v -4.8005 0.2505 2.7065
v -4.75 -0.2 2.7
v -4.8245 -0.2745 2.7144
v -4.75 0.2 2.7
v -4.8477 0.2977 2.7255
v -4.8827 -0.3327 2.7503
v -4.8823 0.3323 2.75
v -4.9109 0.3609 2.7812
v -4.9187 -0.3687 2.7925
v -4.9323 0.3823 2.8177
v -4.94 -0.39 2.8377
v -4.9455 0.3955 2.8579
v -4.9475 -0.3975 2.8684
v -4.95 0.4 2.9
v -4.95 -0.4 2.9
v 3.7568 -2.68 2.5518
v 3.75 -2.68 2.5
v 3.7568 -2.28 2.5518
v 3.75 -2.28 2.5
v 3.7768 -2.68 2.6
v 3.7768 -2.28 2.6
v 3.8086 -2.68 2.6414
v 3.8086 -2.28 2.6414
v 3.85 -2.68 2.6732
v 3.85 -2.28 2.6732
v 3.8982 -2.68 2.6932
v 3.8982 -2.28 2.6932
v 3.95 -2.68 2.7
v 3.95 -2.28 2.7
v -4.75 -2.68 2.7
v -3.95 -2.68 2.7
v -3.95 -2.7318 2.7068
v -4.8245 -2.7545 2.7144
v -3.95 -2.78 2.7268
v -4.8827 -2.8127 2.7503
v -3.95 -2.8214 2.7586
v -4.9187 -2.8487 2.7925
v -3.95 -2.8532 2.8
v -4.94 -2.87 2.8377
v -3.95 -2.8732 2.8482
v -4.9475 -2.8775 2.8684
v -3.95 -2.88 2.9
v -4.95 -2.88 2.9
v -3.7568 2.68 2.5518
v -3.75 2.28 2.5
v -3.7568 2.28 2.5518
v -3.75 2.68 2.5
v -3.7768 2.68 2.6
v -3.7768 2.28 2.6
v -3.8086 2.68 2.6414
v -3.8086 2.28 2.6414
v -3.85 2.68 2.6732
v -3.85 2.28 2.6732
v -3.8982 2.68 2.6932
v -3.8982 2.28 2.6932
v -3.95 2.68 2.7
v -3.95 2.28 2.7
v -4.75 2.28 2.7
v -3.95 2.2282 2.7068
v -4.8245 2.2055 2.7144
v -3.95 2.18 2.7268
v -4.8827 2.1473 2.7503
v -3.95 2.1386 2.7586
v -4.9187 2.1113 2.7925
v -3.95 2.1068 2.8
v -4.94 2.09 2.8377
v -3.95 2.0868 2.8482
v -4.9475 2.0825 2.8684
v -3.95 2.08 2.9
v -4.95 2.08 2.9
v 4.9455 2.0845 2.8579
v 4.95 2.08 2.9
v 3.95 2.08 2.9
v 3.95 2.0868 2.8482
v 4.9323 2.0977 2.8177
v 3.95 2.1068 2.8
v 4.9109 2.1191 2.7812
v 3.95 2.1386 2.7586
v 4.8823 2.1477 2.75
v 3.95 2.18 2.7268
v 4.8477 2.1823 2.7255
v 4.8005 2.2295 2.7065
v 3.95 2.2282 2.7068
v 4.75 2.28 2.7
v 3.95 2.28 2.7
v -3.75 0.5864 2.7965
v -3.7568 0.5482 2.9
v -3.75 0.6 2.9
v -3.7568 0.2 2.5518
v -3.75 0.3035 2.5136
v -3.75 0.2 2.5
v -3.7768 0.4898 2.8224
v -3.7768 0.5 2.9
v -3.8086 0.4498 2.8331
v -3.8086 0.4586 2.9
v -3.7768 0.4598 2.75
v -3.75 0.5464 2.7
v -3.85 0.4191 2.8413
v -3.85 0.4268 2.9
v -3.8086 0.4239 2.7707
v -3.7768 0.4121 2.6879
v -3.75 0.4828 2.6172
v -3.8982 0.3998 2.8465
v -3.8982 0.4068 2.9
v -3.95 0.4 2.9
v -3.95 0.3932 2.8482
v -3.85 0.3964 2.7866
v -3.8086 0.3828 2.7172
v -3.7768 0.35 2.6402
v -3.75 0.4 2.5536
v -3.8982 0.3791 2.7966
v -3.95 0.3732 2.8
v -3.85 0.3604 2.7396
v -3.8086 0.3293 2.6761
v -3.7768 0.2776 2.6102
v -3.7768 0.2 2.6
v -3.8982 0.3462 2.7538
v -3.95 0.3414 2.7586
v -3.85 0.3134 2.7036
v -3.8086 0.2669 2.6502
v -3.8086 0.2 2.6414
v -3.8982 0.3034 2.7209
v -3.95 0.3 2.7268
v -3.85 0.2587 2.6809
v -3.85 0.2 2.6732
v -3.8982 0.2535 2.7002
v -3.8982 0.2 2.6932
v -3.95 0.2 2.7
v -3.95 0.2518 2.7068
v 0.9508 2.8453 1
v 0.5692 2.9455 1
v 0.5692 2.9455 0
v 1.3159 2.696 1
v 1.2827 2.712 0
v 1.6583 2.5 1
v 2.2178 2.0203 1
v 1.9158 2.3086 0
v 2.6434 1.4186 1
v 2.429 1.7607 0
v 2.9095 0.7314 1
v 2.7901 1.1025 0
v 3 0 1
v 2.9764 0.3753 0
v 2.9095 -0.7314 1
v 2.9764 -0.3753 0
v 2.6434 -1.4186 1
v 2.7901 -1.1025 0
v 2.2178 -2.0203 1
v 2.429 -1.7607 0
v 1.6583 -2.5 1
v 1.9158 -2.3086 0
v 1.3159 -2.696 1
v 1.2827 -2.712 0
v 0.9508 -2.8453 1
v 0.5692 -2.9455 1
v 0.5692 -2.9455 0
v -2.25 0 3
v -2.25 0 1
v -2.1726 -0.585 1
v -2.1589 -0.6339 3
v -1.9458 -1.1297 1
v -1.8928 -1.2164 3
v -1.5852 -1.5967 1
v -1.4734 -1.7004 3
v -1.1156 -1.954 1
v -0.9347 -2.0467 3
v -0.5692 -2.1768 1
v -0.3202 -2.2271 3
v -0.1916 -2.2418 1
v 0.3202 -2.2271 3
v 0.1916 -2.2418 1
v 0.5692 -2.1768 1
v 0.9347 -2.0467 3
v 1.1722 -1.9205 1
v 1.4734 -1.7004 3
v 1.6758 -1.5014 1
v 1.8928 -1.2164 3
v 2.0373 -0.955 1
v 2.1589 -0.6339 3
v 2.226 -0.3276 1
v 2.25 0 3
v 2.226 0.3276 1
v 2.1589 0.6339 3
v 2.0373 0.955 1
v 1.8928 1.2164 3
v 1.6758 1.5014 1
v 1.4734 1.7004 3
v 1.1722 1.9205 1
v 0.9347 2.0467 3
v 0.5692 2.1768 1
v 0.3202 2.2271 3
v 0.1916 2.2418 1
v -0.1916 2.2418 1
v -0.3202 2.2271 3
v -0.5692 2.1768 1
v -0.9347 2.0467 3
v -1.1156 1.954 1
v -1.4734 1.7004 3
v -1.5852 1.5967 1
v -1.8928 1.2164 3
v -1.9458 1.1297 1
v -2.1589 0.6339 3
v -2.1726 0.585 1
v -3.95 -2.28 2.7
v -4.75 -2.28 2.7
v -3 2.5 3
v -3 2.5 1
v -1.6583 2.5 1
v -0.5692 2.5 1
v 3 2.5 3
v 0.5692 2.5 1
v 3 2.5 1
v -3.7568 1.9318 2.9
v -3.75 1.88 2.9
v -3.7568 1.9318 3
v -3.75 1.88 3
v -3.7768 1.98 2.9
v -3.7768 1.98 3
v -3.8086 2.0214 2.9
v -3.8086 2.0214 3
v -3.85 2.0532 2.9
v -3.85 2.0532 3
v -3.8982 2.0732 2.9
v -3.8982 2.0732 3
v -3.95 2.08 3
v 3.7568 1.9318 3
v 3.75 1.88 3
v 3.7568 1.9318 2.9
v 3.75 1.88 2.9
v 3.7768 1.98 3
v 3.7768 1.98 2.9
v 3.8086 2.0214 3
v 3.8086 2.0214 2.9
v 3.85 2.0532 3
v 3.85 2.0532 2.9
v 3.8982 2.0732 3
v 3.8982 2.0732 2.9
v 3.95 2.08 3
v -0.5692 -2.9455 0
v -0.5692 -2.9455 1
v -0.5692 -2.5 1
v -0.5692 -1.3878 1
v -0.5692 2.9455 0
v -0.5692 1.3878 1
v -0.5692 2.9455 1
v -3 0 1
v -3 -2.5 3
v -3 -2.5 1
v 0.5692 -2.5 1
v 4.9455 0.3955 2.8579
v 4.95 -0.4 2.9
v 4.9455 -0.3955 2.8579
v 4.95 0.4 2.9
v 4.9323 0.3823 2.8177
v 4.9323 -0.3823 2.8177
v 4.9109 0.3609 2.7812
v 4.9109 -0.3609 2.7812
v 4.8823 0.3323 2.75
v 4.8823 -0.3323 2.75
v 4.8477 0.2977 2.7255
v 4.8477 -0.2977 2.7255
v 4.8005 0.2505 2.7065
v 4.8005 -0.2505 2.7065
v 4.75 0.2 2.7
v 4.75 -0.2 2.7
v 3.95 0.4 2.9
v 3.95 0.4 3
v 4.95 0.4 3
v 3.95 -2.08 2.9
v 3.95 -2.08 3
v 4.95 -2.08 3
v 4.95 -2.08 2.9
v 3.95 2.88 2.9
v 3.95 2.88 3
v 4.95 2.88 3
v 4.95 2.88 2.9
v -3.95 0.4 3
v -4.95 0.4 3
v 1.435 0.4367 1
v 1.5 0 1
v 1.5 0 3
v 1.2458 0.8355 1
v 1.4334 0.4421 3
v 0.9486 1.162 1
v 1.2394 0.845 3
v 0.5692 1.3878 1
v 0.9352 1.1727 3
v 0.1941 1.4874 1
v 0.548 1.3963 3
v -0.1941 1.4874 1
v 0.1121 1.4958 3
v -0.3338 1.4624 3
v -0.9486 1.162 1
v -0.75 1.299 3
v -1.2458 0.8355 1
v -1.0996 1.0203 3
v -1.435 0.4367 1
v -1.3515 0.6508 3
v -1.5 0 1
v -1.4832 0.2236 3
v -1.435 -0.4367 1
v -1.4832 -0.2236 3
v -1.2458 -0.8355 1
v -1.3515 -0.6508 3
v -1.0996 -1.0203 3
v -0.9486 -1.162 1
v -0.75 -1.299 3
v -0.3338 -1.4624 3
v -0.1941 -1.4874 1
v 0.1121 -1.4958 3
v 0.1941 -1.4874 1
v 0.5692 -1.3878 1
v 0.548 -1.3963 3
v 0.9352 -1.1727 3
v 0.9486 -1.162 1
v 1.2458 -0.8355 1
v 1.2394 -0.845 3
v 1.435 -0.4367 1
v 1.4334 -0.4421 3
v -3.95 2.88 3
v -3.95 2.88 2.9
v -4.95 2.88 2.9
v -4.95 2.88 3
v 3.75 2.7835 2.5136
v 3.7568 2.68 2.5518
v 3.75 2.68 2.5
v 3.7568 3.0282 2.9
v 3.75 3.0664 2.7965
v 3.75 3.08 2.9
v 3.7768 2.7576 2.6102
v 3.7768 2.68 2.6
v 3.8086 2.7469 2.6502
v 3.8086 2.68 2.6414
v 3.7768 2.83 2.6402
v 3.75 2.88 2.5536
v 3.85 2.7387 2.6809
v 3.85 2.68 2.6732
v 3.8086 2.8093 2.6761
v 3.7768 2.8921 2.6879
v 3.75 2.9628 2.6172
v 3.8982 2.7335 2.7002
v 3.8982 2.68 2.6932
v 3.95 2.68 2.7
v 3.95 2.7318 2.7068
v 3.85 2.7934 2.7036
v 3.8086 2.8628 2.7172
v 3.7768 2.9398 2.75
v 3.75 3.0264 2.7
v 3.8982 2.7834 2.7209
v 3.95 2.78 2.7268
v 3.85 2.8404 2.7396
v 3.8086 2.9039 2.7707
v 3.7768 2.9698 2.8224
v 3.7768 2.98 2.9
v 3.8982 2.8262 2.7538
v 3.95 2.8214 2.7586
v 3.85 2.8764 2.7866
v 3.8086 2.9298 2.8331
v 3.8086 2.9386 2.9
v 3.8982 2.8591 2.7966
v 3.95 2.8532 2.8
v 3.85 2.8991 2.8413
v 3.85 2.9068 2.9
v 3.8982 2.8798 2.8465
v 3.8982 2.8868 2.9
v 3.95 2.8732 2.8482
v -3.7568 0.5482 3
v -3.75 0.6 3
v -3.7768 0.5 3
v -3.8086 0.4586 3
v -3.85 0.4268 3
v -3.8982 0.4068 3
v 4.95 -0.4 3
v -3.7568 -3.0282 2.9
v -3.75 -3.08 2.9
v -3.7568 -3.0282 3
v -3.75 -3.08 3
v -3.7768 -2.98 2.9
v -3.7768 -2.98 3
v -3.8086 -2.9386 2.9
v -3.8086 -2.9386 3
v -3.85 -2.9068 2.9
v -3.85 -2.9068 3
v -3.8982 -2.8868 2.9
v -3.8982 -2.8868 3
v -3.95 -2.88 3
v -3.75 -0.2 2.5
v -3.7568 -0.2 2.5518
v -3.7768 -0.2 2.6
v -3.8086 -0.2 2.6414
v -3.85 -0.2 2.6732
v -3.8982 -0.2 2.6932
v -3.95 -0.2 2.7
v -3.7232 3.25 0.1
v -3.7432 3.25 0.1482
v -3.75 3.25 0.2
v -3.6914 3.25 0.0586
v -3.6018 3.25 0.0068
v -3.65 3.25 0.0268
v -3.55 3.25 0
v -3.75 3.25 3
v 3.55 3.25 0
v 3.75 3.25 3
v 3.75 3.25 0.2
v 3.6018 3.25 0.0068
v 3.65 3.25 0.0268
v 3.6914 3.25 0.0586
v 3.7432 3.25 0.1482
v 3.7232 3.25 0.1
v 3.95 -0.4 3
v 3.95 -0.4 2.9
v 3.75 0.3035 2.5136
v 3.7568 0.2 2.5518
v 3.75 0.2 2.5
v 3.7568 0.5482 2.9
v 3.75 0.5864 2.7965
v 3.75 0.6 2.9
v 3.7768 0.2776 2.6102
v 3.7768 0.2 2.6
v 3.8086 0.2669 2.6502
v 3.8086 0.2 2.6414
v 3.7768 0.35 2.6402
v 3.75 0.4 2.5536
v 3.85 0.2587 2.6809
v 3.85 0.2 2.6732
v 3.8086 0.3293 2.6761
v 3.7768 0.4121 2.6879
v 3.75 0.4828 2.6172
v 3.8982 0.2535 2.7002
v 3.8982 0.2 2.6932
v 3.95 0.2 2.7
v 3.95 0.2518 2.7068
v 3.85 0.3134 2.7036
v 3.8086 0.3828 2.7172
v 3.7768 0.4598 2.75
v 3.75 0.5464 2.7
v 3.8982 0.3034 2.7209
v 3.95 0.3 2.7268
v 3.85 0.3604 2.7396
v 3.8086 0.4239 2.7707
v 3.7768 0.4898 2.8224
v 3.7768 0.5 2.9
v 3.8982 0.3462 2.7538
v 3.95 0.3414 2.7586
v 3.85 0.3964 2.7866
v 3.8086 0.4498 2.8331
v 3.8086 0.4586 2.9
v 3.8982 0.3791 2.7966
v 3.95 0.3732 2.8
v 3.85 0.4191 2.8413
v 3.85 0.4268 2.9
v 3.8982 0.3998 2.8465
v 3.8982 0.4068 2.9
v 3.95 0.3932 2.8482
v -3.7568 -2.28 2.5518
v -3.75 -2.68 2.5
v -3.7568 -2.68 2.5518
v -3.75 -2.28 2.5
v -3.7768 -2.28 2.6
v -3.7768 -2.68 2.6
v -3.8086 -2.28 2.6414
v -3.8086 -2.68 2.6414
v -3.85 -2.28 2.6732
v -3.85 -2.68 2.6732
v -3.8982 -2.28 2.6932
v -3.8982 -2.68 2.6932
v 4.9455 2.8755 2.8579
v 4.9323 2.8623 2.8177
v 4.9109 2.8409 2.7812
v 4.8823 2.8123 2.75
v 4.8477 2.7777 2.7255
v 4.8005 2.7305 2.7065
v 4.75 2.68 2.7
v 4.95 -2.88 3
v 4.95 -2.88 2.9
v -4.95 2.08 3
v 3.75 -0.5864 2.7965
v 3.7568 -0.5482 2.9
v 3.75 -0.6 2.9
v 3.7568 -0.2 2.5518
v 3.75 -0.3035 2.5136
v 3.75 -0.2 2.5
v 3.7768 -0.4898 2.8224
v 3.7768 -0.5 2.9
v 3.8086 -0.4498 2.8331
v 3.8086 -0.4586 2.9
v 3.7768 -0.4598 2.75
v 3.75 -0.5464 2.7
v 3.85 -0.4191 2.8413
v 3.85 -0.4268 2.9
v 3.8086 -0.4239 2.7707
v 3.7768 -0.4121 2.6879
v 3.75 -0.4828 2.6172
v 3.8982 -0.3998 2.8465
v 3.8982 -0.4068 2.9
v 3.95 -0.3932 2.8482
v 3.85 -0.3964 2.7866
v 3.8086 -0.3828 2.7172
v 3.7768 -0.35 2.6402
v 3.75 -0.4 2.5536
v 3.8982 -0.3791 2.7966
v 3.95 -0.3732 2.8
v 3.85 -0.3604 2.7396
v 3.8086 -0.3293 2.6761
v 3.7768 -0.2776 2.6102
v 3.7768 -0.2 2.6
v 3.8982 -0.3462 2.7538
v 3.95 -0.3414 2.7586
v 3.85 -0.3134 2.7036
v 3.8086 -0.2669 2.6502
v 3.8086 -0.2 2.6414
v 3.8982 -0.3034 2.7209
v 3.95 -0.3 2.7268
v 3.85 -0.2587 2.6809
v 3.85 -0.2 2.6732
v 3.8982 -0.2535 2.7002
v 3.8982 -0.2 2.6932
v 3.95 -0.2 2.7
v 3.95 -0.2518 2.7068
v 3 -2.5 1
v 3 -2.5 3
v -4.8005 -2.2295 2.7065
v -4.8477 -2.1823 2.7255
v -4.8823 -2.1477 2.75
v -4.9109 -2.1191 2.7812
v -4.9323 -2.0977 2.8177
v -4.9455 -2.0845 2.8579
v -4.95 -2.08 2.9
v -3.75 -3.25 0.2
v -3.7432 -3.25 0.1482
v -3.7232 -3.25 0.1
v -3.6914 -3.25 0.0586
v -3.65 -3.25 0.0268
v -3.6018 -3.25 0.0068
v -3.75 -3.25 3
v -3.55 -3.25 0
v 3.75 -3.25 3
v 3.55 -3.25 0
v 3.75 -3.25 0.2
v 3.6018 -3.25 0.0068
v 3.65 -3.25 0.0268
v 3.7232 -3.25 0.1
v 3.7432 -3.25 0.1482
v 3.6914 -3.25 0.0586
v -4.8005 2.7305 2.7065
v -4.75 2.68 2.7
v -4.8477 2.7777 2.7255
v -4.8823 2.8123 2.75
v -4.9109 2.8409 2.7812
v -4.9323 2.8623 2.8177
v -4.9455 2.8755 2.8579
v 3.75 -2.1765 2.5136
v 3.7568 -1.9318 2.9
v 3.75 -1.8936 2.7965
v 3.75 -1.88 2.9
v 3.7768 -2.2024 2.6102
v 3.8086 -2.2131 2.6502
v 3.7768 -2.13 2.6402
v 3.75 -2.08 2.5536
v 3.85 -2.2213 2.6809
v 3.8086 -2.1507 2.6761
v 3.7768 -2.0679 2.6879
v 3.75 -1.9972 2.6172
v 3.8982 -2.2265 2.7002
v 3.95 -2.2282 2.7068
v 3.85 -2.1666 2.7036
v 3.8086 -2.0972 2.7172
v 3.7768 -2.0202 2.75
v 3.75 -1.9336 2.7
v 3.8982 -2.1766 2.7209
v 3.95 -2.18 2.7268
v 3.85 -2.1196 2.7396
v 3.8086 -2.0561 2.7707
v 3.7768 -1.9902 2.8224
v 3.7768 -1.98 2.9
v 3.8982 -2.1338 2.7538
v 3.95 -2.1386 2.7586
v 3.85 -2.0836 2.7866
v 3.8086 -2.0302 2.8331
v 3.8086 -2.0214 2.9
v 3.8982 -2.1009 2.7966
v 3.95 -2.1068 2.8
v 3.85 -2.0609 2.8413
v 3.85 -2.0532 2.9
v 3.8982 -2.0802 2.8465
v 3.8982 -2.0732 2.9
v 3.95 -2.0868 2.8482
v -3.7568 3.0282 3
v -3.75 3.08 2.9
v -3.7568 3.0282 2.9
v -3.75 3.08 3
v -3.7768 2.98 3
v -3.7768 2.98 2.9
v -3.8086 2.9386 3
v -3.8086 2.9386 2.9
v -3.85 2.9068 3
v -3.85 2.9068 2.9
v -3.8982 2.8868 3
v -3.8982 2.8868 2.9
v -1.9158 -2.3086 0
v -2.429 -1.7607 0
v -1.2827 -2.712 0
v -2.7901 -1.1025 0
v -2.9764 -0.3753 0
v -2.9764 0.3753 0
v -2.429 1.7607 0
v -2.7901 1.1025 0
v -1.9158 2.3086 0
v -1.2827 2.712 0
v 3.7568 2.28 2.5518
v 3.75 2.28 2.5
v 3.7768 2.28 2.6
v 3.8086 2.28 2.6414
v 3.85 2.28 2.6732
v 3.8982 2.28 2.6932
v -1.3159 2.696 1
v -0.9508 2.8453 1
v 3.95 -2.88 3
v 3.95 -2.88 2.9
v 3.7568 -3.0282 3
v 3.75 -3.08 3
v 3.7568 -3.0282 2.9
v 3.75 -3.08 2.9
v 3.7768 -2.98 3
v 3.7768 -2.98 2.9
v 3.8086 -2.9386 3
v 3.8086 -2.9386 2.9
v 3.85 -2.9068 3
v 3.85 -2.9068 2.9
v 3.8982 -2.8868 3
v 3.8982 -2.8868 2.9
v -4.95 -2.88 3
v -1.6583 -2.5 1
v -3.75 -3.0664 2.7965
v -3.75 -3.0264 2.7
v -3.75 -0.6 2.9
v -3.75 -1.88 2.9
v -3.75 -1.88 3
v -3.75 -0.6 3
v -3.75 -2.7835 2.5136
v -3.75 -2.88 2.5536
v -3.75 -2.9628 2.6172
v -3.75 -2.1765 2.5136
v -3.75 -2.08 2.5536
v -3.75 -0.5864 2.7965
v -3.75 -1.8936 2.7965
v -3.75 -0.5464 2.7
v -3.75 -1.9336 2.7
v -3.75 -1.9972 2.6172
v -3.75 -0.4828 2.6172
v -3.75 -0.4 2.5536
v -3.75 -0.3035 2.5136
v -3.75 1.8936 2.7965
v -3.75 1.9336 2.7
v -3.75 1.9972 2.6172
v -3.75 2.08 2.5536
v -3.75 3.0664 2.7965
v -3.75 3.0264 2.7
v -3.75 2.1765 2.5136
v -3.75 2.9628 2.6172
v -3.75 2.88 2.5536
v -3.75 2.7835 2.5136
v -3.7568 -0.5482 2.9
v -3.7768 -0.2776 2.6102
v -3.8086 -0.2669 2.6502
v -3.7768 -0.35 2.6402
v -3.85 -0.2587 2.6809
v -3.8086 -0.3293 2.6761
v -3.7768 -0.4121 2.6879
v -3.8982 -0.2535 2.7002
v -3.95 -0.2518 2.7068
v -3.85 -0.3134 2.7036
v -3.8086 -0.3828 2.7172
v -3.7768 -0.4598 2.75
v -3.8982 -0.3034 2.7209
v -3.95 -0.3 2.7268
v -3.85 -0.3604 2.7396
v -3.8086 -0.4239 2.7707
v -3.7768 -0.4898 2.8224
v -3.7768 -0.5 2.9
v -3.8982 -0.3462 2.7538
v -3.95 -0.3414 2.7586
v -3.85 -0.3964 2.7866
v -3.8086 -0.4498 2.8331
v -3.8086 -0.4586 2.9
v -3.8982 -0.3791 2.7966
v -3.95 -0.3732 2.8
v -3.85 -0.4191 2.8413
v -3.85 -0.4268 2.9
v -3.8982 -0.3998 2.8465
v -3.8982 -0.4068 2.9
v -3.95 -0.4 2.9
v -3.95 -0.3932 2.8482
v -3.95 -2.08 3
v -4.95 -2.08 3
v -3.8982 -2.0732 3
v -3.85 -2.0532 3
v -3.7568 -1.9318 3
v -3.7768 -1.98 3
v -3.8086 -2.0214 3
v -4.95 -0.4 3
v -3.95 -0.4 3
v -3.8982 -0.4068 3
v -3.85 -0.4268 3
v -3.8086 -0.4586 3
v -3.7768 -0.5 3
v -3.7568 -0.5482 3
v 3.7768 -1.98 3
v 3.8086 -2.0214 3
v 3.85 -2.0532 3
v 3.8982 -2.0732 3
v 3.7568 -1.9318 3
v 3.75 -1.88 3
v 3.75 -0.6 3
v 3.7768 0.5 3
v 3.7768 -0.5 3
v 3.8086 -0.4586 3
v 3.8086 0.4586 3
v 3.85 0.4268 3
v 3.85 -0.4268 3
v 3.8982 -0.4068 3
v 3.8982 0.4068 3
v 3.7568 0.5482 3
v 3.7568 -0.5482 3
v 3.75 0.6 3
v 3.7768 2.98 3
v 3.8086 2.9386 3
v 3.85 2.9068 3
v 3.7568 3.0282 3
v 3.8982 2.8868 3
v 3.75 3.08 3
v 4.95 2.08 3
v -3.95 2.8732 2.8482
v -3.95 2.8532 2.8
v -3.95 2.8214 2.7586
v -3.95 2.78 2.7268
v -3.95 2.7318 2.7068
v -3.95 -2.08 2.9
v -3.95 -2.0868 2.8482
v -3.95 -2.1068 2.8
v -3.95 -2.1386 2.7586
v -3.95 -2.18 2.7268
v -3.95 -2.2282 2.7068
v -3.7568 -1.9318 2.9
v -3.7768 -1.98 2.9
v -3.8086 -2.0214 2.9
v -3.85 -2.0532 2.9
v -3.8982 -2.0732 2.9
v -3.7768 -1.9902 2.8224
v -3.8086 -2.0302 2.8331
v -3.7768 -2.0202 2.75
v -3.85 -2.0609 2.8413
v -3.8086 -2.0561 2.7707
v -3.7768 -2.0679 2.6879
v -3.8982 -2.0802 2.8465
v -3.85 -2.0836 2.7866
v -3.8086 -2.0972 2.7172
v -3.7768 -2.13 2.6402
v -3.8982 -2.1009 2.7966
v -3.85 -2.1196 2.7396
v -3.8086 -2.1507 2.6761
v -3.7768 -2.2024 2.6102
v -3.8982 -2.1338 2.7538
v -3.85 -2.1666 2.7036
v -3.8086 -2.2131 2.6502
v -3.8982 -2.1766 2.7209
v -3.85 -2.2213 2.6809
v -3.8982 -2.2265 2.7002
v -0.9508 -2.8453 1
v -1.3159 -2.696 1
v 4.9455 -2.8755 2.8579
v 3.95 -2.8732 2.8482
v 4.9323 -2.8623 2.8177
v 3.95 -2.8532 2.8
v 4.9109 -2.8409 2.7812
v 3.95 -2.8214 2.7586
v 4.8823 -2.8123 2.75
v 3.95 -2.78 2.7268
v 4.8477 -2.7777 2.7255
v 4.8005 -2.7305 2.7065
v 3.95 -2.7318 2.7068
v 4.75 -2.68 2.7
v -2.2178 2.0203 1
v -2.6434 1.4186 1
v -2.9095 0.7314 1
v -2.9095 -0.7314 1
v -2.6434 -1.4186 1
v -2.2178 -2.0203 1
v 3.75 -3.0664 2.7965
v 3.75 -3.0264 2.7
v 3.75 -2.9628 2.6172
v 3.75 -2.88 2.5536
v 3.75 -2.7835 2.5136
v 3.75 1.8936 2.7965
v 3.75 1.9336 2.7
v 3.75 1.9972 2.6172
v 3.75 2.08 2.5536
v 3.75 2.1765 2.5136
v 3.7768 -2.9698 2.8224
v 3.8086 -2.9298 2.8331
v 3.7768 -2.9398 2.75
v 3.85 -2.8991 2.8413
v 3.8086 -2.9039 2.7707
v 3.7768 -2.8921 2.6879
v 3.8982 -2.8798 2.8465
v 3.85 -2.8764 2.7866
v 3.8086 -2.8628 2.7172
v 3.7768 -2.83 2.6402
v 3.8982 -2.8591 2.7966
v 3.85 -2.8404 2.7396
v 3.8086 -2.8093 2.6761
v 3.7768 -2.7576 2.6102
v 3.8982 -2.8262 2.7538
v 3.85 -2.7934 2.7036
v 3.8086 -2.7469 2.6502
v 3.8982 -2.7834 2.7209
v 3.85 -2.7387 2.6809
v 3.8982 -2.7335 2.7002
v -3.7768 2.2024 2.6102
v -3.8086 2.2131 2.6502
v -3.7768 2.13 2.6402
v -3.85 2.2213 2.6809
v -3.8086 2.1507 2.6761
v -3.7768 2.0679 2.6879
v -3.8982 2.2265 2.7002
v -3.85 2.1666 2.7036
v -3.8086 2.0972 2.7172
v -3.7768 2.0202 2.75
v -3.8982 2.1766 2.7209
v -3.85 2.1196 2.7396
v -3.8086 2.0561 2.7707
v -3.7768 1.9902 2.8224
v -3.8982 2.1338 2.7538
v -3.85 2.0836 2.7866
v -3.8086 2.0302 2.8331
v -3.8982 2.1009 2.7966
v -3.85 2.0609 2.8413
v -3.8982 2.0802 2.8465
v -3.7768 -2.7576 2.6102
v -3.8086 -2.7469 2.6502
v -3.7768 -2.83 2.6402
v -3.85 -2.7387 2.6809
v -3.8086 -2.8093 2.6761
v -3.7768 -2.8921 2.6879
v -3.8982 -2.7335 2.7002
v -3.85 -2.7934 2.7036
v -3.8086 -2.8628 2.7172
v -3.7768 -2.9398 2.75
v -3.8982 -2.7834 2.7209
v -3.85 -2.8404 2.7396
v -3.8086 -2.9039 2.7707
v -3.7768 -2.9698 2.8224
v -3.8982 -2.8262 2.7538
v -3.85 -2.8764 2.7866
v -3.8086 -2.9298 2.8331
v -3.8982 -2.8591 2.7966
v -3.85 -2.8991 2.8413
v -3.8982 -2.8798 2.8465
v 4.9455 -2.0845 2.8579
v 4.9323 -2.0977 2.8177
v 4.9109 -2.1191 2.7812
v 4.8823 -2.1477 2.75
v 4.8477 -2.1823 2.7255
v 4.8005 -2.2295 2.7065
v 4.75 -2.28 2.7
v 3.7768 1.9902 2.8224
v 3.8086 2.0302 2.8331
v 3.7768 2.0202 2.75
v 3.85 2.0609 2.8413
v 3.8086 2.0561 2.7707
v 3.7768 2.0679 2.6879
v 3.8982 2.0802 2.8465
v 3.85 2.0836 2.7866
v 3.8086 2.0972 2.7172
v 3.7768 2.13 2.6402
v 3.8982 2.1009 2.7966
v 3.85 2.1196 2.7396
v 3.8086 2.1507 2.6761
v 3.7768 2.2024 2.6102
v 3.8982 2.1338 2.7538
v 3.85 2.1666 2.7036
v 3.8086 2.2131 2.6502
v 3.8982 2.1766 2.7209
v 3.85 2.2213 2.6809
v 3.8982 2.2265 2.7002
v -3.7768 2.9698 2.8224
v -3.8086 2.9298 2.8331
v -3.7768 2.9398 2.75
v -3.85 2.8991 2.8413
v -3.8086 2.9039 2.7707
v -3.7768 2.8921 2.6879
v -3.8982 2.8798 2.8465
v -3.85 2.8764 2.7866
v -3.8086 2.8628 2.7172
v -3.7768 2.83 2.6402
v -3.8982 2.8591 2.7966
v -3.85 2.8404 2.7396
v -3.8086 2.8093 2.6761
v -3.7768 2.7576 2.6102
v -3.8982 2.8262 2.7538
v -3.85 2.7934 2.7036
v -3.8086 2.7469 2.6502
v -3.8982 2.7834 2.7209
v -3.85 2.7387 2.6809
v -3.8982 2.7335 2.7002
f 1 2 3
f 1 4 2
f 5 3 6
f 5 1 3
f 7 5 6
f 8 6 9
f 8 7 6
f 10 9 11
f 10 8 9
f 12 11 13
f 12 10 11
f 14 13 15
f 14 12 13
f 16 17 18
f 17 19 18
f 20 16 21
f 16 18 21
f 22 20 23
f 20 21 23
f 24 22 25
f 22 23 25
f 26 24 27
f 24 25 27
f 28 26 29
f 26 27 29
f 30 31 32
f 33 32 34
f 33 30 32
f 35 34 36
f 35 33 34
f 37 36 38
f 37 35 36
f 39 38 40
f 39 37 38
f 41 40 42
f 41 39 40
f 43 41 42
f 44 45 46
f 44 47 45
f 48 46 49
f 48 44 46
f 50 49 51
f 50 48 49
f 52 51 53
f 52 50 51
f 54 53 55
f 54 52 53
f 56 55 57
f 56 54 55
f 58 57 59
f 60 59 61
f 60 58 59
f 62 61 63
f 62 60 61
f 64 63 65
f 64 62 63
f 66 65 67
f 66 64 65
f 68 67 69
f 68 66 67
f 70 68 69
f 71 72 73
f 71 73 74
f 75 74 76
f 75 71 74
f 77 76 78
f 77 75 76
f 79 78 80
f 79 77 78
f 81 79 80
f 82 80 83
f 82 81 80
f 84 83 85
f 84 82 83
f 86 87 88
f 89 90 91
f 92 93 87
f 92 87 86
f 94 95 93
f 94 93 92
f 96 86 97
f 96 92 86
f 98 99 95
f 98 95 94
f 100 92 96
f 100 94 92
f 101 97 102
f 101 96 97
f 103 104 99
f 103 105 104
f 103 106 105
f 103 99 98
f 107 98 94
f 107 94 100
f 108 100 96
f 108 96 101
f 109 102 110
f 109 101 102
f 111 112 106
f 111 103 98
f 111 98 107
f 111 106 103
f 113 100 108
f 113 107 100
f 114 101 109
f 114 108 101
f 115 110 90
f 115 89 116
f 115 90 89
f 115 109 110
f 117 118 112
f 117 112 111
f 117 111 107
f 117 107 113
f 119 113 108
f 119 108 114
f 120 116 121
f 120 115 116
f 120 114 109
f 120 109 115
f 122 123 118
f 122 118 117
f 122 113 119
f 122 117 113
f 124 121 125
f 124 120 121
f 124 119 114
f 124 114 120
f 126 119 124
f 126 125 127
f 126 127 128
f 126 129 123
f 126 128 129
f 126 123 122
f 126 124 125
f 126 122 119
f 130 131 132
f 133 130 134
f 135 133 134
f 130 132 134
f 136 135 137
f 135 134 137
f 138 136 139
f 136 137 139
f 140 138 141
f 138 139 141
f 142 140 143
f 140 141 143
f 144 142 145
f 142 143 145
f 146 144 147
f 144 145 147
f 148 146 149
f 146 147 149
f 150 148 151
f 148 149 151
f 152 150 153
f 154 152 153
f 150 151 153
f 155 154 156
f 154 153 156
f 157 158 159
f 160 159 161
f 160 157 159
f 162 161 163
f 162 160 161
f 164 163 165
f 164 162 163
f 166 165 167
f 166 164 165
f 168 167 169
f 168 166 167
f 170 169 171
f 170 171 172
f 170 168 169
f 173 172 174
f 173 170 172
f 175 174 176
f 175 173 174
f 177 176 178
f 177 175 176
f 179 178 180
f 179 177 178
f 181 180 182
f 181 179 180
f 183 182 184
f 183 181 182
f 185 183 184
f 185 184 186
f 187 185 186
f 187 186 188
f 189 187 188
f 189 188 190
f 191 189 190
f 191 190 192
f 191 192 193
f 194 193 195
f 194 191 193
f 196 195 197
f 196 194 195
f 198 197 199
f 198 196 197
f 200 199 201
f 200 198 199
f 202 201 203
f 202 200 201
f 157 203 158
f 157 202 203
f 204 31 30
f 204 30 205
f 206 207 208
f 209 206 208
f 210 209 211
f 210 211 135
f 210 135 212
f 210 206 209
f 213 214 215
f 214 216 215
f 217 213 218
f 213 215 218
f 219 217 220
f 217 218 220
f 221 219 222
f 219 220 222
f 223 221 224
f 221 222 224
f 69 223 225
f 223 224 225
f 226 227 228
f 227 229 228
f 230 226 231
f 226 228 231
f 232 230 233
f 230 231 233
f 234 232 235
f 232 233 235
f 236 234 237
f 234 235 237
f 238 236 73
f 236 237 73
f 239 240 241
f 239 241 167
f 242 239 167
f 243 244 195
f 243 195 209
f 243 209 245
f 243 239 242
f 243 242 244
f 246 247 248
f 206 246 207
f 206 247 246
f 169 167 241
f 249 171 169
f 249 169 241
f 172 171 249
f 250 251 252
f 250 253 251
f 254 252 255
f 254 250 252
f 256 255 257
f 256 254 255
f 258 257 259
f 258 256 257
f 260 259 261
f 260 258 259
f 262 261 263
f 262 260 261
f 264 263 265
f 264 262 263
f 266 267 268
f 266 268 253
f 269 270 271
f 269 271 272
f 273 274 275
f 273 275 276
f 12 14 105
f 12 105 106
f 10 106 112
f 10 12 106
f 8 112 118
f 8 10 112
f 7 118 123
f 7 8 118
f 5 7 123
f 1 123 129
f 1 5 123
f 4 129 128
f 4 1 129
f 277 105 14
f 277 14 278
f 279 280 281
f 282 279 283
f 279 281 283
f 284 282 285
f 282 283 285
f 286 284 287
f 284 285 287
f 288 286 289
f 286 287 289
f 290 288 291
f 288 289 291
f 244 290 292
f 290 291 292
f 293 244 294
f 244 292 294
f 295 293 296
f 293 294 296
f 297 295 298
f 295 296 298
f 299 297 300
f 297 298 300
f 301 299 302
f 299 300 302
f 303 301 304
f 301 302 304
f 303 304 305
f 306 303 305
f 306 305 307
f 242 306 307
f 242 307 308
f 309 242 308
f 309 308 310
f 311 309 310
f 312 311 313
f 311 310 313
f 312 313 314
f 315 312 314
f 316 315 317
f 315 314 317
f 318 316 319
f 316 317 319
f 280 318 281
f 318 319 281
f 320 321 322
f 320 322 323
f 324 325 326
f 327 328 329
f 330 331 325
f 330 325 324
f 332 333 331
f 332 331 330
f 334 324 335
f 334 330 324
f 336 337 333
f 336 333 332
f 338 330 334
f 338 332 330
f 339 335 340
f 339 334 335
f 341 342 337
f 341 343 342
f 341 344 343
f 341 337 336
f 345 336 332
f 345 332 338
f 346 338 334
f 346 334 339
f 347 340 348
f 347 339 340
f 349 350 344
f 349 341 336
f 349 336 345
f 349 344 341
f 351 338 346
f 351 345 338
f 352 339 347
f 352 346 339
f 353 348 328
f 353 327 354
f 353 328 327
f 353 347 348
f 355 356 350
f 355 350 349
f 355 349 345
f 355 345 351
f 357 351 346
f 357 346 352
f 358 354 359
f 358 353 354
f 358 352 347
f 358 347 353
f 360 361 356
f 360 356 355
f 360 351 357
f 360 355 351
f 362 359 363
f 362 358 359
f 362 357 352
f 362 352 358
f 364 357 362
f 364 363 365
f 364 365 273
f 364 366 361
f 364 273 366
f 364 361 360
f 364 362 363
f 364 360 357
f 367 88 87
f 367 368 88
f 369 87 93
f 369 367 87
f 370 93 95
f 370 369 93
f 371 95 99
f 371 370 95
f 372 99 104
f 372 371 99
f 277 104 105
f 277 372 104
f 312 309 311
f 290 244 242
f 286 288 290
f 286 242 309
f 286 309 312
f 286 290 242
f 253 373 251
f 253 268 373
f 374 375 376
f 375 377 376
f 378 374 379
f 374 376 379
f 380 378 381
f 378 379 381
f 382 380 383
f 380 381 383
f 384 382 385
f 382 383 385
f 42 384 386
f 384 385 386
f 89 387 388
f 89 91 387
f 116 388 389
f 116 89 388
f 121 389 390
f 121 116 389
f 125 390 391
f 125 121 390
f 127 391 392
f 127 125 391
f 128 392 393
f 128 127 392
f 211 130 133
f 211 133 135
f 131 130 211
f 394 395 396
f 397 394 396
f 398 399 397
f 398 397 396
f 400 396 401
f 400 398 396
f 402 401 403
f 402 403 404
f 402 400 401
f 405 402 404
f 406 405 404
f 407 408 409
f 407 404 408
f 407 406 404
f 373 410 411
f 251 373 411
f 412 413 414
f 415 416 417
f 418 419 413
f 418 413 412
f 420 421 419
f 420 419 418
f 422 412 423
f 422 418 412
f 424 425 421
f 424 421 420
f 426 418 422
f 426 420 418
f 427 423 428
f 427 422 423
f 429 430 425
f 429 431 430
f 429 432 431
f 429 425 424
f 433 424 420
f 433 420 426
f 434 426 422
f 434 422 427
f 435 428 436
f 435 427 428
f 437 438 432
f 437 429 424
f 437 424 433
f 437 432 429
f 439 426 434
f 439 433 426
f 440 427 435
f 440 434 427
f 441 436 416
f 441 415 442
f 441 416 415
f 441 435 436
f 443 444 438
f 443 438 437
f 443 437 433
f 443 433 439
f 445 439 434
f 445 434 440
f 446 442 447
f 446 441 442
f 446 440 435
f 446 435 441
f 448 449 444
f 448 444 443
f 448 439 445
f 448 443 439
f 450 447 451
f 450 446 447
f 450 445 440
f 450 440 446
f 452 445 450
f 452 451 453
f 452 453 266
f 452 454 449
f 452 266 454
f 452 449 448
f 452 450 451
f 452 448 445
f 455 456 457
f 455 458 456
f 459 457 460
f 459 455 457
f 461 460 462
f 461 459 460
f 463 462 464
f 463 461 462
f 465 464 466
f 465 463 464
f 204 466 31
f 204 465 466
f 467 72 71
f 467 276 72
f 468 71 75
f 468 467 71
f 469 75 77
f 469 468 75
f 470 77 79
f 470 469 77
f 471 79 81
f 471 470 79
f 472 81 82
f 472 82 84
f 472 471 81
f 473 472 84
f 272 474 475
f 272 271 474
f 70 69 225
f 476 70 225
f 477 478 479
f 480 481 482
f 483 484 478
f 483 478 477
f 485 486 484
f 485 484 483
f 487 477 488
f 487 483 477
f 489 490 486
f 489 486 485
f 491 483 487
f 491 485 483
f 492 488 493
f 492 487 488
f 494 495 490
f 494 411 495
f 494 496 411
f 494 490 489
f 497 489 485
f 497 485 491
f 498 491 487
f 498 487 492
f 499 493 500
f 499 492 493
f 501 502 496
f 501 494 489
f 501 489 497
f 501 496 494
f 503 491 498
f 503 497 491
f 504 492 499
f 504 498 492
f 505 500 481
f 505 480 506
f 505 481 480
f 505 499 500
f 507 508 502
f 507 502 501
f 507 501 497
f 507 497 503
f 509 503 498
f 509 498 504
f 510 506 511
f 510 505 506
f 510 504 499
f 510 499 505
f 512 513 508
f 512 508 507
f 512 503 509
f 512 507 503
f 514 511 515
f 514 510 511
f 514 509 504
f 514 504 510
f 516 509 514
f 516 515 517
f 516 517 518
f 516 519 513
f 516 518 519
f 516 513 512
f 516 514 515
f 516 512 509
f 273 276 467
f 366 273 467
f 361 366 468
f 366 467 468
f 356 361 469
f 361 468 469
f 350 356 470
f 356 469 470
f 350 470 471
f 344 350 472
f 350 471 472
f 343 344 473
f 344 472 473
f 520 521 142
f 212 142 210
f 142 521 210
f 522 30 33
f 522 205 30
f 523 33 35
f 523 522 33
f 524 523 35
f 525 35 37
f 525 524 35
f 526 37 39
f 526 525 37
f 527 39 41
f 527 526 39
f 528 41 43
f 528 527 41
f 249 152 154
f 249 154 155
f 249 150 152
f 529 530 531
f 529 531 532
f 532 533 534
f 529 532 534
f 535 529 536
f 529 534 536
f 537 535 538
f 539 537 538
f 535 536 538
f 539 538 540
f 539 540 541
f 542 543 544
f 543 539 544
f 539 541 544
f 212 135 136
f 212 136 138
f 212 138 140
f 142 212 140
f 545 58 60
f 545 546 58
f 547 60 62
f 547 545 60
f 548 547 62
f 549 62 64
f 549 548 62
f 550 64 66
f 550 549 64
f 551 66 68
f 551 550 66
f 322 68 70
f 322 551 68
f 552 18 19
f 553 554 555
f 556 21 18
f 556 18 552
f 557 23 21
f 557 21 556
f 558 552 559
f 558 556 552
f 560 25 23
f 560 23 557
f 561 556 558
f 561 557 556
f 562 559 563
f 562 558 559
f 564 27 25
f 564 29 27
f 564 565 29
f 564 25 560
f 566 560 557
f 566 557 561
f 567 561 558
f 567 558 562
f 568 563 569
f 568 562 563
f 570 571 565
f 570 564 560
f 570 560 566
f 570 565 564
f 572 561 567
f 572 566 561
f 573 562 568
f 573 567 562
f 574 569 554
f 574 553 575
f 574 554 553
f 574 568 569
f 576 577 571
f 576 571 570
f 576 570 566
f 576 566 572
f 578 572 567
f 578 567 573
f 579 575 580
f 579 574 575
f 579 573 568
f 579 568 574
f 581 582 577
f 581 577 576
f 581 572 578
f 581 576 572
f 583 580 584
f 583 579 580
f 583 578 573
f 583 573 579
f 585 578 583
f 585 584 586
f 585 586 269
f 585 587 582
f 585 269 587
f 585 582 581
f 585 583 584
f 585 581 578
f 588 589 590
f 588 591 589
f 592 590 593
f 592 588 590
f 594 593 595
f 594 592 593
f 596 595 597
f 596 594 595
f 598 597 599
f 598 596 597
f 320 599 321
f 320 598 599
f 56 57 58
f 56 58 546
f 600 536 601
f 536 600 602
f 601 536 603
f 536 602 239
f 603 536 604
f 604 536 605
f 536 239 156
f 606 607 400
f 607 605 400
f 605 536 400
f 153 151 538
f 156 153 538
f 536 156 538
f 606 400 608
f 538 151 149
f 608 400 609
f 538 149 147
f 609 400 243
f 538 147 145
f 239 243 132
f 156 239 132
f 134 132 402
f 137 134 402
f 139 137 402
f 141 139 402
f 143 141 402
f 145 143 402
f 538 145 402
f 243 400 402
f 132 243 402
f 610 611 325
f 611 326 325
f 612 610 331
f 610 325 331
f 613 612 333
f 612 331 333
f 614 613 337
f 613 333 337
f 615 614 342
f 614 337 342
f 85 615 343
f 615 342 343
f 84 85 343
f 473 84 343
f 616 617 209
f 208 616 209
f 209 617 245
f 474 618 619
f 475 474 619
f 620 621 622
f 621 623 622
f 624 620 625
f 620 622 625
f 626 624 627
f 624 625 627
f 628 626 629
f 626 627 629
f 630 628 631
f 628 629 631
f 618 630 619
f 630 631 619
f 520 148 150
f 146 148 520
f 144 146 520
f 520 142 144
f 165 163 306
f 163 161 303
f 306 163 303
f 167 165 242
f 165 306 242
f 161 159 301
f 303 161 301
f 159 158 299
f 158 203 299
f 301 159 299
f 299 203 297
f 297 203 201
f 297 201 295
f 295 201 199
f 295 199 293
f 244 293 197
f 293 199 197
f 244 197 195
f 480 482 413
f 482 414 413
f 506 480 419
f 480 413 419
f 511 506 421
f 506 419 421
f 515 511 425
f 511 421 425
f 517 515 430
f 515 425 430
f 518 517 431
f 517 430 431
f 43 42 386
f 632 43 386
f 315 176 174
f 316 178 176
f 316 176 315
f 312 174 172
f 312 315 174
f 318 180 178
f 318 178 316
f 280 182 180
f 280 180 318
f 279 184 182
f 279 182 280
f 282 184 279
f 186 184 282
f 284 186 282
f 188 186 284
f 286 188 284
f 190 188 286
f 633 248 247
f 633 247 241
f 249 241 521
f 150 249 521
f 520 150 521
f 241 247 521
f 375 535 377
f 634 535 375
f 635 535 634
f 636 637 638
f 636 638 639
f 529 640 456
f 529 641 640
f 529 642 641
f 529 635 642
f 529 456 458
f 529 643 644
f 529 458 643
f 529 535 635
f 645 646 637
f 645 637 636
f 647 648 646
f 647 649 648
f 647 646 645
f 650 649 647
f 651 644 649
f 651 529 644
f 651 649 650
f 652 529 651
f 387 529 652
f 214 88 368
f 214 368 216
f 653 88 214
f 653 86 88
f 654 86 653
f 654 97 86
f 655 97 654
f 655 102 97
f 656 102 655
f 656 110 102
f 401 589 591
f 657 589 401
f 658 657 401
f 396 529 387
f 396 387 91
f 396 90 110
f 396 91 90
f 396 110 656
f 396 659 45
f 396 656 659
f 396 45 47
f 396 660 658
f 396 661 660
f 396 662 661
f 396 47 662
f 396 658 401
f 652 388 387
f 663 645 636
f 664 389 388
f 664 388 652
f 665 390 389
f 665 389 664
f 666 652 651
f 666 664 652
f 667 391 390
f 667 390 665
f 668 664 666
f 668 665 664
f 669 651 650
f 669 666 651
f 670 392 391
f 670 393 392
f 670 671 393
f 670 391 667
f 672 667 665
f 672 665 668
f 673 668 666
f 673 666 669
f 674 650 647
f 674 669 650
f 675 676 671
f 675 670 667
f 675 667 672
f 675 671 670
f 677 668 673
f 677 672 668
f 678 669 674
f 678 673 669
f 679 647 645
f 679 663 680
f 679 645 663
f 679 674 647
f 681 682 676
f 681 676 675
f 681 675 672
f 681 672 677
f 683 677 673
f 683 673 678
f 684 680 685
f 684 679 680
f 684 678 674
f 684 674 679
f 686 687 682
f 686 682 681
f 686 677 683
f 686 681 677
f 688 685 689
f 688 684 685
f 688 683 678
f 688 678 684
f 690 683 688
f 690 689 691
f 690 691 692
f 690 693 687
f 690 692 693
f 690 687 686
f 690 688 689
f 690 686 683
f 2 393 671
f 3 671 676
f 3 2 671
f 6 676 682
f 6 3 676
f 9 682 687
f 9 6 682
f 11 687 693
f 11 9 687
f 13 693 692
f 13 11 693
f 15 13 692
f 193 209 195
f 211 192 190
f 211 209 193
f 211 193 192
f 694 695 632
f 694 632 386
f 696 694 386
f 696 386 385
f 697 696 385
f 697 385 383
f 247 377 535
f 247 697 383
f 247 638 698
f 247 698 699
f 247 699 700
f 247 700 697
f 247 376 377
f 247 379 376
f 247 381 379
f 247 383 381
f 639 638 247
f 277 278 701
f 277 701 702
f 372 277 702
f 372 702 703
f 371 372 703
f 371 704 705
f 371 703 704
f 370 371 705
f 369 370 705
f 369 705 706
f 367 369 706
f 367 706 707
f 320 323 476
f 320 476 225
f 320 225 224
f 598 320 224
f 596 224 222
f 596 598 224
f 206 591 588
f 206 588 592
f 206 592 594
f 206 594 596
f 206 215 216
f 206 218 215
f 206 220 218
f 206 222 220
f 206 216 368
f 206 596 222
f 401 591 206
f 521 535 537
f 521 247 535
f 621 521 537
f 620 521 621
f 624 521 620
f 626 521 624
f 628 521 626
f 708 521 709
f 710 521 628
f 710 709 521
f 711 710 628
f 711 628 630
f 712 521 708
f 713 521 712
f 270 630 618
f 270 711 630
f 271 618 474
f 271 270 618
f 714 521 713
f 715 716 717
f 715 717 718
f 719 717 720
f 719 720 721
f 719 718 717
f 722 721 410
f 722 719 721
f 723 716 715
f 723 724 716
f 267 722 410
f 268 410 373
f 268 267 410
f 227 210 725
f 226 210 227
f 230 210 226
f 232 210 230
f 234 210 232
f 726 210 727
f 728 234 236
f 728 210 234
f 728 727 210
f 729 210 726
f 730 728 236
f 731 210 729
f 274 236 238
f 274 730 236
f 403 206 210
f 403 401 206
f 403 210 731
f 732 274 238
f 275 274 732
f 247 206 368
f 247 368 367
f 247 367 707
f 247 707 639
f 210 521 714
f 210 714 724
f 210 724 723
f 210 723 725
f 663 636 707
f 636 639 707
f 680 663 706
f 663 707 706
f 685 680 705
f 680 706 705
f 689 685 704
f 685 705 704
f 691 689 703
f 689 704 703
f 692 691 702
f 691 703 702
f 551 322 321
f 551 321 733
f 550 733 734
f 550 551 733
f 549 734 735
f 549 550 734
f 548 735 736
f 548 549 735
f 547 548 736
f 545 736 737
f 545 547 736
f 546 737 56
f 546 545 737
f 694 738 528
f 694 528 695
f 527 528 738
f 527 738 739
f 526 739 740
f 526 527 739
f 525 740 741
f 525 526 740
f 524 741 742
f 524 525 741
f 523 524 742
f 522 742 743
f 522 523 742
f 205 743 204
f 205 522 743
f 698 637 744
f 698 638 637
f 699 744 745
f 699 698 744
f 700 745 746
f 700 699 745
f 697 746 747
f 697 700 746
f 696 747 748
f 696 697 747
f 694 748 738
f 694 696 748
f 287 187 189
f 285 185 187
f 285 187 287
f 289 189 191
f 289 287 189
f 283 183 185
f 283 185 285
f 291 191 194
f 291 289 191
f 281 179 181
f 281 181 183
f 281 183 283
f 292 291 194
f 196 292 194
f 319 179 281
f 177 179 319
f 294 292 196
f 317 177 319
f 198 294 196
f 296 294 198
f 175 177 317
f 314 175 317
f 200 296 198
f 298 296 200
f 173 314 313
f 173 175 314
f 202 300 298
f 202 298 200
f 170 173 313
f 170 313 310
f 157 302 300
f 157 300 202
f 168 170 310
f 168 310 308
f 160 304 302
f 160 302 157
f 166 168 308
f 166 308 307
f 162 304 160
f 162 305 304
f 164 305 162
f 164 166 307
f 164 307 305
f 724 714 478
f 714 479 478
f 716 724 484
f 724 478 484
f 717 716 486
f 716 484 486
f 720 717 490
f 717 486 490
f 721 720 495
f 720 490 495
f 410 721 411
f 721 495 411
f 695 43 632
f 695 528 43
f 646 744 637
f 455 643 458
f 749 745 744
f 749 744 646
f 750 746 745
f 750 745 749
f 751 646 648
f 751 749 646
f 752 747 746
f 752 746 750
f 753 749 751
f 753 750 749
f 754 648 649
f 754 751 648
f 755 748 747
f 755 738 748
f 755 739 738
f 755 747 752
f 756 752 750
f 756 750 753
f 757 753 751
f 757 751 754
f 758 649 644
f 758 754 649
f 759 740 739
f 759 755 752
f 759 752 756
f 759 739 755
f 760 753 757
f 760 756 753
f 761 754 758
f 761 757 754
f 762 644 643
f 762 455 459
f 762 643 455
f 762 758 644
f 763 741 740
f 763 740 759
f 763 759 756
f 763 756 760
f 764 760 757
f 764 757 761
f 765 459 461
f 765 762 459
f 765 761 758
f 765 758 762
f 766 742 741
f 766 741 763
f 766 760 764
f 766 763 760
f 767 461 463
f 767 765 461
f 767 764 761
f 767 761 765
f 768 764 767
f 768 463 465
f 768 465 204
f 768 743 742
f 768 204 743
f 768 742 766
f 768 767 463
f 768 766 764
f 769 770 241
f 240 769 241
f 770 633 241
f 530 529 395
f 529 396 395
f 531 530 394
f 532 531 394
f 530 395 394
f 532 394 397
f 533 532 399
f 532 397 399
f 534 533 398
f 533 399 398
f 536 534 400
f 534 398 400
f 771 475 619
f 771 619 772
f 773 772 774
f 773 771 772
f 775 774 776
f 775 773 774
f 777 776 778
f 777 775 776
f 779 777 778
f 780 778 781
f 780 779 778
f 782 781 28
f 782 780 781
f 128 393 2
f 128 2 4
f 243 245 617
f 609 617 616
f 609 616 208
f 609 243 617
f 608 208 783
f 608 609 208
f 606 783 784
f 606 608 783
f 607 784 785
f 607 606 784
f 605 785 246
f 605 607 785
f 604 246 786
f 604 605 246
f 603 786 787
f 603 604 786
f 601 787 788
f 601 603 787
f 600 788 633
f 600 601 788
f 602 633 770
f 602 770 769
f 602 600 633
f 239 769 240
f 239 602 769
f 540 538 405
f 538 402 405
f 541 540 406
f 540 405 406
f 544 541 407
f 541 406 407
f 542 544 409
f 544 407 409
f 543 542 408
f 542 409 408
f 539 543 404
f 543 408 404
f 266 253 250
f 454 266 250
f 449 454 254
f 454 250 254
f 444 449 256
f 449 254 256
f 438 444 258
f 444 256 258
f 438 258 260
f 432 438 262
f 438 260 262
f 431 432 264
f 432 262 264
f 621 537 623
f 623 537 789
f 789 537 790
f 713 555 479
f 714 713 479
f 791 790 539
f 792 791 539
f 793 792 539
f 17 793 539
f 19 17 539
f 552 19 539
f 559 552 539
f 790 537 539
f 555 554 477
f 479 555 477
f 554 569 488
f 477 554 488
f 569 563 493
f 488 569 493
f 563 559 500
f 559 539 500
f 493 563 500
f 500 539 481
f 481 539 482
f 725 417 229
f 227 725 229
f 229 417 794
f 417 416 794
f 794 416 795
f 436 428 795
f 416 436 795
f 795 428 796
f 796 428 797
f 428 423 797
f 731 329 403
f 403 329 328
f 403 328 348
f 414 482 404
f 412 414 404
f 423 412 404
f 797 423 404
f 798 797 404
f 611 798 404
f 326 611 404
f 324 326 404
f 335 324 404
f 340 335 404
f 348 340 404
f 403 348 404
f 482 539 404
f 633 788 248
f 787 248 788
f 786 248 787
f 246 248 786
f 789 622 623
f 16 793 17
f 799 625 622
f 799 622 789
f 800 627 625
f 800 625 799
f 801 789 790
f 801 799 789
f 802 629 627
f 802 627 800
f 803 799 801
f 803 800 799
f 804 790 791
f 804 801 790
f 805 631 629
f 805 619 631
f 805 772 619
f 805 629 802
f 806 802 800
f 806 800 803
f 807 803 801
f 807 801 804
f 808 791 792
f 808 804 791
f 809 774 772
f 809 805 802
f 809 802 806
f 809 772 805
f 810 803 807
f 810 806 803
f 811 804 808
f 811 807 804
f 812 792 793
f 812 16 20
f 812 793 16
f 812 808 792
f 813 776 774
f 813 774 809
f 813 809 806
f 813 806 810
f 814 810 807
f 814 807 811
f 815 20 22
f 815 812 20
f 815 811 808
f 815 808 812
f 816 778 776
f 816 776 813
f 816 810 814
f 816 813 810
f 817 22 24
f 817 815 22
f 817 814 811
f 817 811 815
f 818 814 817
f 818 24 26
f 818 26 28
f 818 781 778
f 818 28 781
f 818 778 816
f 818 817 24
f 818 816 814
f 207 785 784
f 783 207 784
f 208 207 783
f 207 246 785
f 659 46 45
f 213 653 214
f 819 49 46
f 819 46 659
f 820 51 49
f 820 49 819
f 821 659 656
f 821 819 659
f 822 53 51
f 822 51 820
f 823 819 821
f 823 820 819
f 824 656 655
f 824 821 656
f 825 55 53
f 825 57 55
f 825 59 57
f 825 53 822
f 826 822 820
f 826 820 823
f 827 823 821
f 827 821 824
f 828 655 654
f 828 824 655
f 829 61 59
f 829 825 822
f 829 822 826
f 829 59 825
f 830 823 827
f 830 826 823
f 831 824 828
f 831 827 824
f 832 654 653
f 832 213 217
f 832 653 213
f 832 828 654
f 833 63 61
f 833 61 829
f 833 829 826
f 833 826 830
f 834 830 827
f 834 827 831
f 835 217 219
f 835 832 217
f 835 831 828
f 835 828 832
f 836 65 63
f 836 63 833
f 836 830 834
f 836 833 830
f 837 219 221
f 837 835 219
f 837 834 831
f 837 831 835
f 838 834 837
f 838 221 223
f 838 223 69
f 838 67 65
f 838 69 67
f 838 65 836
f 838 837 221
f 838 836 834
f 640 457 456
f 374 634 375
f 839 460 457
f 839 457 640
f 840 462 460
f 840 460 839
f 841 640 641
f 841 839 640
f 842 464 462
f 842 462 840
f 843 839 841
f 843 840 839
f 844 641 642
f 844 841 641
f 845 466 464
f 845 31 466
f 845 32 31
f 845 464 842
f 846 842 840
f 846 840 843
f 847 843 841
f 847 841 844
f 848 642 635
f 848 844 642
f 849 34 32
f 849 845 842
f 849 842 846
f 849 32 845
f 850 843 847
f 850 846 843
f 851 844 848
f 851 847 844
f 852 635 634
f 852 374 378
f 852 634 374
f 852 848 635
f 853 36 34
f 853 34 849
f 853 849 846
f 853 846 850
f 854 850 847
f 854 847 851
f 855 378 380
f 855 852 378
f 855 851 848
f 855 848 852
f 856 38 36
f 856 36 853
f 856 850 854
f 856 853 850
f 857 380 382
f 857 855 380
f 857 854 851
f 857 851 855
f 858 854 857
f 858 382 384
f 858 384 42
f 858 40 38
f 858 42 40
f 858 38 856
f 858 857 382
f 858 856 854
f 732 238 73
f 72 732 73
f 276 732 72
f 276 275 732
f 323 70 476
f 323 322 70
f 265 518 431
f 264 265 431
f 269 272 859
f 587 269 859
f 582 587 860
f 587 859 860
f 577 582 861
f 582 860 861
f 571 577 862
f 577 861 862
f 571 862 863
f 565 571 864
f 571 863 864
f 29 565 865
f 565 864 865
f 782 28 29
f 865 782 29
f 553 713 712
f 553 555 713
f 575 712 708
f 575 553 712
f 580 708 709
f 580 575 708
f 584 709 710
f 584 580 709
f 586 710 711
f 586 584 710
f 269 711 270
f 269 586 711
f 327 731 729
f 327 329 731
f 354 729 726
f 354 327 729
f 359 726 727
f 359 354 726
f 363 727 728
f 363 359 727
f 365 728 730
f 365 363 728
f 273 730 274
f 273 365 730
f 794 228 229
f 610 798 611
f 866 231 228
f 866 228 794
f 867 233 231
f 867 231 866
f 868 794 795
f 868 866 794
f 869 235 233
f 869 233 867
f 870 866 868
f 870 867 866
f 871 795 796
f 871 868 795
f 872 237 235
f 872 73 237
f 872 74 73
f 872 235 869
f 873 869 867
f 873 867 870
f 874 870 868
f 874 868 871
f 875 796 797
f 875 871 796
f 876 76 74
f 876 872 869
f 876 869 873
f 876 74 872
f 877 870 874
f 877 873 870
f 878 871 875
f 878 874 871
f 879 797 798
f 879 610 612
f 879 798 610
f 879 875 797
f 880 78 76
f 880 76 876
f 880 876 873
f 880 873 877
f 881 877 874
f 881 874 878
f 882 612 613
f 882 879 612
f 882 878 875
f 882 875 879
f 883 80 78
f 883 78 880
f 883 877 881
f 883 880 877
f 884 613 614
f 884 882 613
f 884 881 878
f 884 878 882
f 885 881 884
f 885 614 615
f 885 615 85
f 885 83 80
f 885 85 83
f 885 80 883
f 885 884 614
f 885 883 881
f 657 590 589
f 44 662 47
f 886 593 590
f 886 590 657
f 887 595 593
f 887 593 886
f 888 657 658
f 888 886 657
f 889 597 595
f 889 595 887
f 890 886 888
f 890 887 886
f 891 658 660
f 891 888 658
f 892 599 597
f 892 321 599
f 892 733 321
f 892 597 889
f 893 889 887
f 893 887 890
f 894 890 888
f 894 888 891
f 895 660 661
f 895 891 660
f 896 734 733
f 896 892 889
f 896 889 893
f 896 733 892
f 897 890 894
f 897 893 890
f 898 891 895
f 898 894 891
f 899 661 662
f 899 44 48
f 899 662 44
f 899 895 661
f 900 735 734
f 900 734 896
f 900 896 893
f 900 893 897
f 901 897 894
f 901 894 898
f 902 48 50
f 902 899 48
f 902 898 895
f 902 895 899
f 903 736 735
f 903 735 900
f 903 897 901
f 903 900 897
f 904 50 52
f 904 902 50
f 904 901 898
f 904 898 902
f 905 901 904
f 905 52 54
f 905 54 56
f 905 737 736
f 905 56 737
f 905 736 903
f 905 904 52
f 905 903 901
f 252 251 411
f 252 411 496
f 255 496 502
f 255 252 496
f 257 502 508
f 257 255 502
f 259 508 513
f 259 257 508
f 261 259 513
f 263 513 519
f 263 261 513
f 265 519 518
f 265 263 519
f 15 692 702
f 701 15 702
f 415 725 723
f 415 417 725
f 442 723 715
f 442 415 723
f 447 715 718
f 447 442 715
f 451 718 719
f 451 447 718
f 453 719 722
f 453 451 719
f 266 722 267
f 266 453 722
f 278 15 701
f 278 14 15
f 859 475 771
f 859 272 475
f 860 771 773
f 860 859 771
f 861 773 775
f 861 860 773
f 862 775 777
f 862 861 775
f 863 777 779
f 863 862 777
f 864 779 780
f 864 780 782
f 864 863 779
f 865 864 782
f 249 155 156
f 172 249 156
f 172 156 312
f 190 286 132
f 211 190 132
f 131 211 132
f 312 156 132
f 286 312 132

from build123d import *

# Parameters (mm, degrees)
SKETCH_1_W          = 7.5
SKETCH_1_H          = 6.5
EXTRUDE_1_DEPTH     = 3
SKETCH_2_W          = 6
SKETCH_2_H          = 5
CUT_EXTRUDE_1_DEPTH = 2
SKETCH_3_R          = 2.25
EXTRUDE_2_DEPTH     = 1
SKETCH_4_R          = 1.5
CUT_EXTRUDE_2_DEPTH = 1
CUT_EXTRUDE_5_DEPTH = 1
SKETCH_9_W          = 0.3
SKETCH_9_H          = 0.8
EXTRUDE_5_DEPTH     = 1.2
SKETCH_11_W         = 0.3
SKETCH_11_H         = 0.8
EXTRUDE_6_DEPTH     = 1.2
FILLET_4_R          = 0.2
FILLET_5_R          = 0.2


with BuildPart() as part:
    # 草图1 → 凸台-拉伸1 (new body)
    with BuildSketch(Plane.XY):
        Rectangle(SKETCH_1_W, SKETCH_1_H)
    extrude(amount=EXTRUDE_1_DEPTH)

    # 草图2 → 切除-拉伸1 (cut)
    with BuildSketch(Plane.XY.offset(3)):
        Rectangle(SKETCH_2_W, SKETCH_2_H)
    extrude(amount=-CUT_EXTRUDE_1_DEPTH, mode=Mode.SUBTRACT)

    # 草图3 → 凸台-拉伸2 (add, symmetric)
    with BuildSketch(Plane.XY.offset(2)):
        with Locations(Location((0, 0, 0), (0, 0, 180))):
            Circle(SKETCH_3_R)
    extrude(amount=EXTRUDE_2_DEPTH, both=True)

    # 草图4 → 切除-拉伸2 (cut, symmetric)
    with BuildSketch(Plane.XY.offset(2)):
        Circle(SKETCH_4_R)
    extrude(amount=CUT_EXTRUDE_2_DEPTH, both=True, mode=Mode.SUBTRACT)

    # 草图8 → 切除-拉伸5 (cut)
    with BuildSketch(Plane(origin=(0, 0, 0), x_dir=(-1, 0, 0), z_dir=(0, 0, -1))):
        with BuildLine():
            Line((-0.56924828, -2.945497648), (-0.56924828, 2.945497648))
            ThreePointArc((-0.56924828, 2.945497648), (-3, 0), (-0.56924828, -2.945497648))
        make_face()
        with BuildLine():
            Line((0.56924828, -2.945497648), (0.56924828, 2.945497648))
            ThreePointArc((0.56924828, 2.945497648), (3, 0), (0.56924828, -2.945497648))
        make_face()
    extrude(amount=-CUT_EXTRUDE_5_DEPTH, mode=Mode.SUBTRACT)

    # 草图9 → 凸台-拉伸5 (add)
    with BuildSketch(Plane(origin=(3.75, 0, 0), x_dir=(0, 0, -1), z_dir=(1, 0, 0))):
        with Locations((-2.85, 2.48)):
            Rectangle(SKETCH_9_W, SKETCH_9_H)
        with Locations((-2.85, -2.48)):
            Rectangle(SKETCH_9_W, SKETCH_9_H)
        with Locations((-2.85, 0)):
            Rectangle(SKETCH_9_W, SKETCH_9_H)
    extrude(amount=EXTRUDE_5_DEPTH)

    # 草图11 → 凸台-拉伸6 (add)
    with BuildSketch(Plane.ZY.offset(3.75)):
        with Locations((2.85, 2.48)):
            Rectangle(SKETCH_11_W, SKETCH_11_H)
        with Locations((2.85, -2.48)):
            Rectangle(SKETCH_11_W, SKETCH_11_H)
        with Locations((2.85, 0)):
            Rectangle(SKETCH_11_W, SKETCH_11_H)
    extrude(amount=EXTRUDE_6_DEPTH)

    # 圆角4
    fillet_4_edges = [part.edges().sort_by_distance(p)[0] for p in [
        (3.75, -0.4, 2.85),
        (3.75, 0, 2.7),
        (4.35, -0.4, 2.7),
        (3.75, 0.4, 2.85),
        (4.35, 0.4, 2.7),
        (4.95, 0, 2.7),
        (-3.75, 2.88, 2.85),
        (-3.75, 2.48, 2.7),
        (-4.35, 2.88, 2.7),
        (-3.75, 2.08, 2.85),
        (-4.35, 2.08, 2.7),
        (-4.95, 2.48, 2.7),
        (-3.75, -2.08, 2.85),
        (-3.75, -2.48, 2.7),
        (-4.35, -2.08, 2.7),
        (-3.75, -2.88, 2.85),
        (-4.35, -2.88, 2.7),
        (-4.95, -2.48, 2.7),
        (-3.75, 0.4, 2.85),
        (-3.75, 0, 2.7),
        (-4.35, 0.4, 2.7),
        (-3.75, -0.4, 2.85),
        (-4.35, -0.4, 2.7),
        (-4.95, 0, 2.7),
        (3.75, 2.08, 2.85),
        (3.75, 2.48, 2.7),
        (4.35, 2.08, 2.7),
        (3.75, 2.88, 2.85),
        (4.35, 2.88, 2.7),
        (4.95, 2.48, 2.7),
        (3.75, -2.88, 2.85),
        (3.75, -2.48, 2.7),
        (4.35, -2.88, 2.7),
        (3.75, -2.08, 2.85),
        (4.35, -2.08, 2.7),
        (4.95, -2.48, 2.7),
    ]]
    fillet(fillet_4_edges, radius=FILLET_4_R)

    # 圆角5
    fillet_5_edges = [part.edges().sort_by_distance(p)[0] for p in [
        (-3.75, 0, 0),
        (3.75, 0, 0),
    ]]
    fillet(fillet_5_edges, radius=FILLET_5_R)


solid = part.part
